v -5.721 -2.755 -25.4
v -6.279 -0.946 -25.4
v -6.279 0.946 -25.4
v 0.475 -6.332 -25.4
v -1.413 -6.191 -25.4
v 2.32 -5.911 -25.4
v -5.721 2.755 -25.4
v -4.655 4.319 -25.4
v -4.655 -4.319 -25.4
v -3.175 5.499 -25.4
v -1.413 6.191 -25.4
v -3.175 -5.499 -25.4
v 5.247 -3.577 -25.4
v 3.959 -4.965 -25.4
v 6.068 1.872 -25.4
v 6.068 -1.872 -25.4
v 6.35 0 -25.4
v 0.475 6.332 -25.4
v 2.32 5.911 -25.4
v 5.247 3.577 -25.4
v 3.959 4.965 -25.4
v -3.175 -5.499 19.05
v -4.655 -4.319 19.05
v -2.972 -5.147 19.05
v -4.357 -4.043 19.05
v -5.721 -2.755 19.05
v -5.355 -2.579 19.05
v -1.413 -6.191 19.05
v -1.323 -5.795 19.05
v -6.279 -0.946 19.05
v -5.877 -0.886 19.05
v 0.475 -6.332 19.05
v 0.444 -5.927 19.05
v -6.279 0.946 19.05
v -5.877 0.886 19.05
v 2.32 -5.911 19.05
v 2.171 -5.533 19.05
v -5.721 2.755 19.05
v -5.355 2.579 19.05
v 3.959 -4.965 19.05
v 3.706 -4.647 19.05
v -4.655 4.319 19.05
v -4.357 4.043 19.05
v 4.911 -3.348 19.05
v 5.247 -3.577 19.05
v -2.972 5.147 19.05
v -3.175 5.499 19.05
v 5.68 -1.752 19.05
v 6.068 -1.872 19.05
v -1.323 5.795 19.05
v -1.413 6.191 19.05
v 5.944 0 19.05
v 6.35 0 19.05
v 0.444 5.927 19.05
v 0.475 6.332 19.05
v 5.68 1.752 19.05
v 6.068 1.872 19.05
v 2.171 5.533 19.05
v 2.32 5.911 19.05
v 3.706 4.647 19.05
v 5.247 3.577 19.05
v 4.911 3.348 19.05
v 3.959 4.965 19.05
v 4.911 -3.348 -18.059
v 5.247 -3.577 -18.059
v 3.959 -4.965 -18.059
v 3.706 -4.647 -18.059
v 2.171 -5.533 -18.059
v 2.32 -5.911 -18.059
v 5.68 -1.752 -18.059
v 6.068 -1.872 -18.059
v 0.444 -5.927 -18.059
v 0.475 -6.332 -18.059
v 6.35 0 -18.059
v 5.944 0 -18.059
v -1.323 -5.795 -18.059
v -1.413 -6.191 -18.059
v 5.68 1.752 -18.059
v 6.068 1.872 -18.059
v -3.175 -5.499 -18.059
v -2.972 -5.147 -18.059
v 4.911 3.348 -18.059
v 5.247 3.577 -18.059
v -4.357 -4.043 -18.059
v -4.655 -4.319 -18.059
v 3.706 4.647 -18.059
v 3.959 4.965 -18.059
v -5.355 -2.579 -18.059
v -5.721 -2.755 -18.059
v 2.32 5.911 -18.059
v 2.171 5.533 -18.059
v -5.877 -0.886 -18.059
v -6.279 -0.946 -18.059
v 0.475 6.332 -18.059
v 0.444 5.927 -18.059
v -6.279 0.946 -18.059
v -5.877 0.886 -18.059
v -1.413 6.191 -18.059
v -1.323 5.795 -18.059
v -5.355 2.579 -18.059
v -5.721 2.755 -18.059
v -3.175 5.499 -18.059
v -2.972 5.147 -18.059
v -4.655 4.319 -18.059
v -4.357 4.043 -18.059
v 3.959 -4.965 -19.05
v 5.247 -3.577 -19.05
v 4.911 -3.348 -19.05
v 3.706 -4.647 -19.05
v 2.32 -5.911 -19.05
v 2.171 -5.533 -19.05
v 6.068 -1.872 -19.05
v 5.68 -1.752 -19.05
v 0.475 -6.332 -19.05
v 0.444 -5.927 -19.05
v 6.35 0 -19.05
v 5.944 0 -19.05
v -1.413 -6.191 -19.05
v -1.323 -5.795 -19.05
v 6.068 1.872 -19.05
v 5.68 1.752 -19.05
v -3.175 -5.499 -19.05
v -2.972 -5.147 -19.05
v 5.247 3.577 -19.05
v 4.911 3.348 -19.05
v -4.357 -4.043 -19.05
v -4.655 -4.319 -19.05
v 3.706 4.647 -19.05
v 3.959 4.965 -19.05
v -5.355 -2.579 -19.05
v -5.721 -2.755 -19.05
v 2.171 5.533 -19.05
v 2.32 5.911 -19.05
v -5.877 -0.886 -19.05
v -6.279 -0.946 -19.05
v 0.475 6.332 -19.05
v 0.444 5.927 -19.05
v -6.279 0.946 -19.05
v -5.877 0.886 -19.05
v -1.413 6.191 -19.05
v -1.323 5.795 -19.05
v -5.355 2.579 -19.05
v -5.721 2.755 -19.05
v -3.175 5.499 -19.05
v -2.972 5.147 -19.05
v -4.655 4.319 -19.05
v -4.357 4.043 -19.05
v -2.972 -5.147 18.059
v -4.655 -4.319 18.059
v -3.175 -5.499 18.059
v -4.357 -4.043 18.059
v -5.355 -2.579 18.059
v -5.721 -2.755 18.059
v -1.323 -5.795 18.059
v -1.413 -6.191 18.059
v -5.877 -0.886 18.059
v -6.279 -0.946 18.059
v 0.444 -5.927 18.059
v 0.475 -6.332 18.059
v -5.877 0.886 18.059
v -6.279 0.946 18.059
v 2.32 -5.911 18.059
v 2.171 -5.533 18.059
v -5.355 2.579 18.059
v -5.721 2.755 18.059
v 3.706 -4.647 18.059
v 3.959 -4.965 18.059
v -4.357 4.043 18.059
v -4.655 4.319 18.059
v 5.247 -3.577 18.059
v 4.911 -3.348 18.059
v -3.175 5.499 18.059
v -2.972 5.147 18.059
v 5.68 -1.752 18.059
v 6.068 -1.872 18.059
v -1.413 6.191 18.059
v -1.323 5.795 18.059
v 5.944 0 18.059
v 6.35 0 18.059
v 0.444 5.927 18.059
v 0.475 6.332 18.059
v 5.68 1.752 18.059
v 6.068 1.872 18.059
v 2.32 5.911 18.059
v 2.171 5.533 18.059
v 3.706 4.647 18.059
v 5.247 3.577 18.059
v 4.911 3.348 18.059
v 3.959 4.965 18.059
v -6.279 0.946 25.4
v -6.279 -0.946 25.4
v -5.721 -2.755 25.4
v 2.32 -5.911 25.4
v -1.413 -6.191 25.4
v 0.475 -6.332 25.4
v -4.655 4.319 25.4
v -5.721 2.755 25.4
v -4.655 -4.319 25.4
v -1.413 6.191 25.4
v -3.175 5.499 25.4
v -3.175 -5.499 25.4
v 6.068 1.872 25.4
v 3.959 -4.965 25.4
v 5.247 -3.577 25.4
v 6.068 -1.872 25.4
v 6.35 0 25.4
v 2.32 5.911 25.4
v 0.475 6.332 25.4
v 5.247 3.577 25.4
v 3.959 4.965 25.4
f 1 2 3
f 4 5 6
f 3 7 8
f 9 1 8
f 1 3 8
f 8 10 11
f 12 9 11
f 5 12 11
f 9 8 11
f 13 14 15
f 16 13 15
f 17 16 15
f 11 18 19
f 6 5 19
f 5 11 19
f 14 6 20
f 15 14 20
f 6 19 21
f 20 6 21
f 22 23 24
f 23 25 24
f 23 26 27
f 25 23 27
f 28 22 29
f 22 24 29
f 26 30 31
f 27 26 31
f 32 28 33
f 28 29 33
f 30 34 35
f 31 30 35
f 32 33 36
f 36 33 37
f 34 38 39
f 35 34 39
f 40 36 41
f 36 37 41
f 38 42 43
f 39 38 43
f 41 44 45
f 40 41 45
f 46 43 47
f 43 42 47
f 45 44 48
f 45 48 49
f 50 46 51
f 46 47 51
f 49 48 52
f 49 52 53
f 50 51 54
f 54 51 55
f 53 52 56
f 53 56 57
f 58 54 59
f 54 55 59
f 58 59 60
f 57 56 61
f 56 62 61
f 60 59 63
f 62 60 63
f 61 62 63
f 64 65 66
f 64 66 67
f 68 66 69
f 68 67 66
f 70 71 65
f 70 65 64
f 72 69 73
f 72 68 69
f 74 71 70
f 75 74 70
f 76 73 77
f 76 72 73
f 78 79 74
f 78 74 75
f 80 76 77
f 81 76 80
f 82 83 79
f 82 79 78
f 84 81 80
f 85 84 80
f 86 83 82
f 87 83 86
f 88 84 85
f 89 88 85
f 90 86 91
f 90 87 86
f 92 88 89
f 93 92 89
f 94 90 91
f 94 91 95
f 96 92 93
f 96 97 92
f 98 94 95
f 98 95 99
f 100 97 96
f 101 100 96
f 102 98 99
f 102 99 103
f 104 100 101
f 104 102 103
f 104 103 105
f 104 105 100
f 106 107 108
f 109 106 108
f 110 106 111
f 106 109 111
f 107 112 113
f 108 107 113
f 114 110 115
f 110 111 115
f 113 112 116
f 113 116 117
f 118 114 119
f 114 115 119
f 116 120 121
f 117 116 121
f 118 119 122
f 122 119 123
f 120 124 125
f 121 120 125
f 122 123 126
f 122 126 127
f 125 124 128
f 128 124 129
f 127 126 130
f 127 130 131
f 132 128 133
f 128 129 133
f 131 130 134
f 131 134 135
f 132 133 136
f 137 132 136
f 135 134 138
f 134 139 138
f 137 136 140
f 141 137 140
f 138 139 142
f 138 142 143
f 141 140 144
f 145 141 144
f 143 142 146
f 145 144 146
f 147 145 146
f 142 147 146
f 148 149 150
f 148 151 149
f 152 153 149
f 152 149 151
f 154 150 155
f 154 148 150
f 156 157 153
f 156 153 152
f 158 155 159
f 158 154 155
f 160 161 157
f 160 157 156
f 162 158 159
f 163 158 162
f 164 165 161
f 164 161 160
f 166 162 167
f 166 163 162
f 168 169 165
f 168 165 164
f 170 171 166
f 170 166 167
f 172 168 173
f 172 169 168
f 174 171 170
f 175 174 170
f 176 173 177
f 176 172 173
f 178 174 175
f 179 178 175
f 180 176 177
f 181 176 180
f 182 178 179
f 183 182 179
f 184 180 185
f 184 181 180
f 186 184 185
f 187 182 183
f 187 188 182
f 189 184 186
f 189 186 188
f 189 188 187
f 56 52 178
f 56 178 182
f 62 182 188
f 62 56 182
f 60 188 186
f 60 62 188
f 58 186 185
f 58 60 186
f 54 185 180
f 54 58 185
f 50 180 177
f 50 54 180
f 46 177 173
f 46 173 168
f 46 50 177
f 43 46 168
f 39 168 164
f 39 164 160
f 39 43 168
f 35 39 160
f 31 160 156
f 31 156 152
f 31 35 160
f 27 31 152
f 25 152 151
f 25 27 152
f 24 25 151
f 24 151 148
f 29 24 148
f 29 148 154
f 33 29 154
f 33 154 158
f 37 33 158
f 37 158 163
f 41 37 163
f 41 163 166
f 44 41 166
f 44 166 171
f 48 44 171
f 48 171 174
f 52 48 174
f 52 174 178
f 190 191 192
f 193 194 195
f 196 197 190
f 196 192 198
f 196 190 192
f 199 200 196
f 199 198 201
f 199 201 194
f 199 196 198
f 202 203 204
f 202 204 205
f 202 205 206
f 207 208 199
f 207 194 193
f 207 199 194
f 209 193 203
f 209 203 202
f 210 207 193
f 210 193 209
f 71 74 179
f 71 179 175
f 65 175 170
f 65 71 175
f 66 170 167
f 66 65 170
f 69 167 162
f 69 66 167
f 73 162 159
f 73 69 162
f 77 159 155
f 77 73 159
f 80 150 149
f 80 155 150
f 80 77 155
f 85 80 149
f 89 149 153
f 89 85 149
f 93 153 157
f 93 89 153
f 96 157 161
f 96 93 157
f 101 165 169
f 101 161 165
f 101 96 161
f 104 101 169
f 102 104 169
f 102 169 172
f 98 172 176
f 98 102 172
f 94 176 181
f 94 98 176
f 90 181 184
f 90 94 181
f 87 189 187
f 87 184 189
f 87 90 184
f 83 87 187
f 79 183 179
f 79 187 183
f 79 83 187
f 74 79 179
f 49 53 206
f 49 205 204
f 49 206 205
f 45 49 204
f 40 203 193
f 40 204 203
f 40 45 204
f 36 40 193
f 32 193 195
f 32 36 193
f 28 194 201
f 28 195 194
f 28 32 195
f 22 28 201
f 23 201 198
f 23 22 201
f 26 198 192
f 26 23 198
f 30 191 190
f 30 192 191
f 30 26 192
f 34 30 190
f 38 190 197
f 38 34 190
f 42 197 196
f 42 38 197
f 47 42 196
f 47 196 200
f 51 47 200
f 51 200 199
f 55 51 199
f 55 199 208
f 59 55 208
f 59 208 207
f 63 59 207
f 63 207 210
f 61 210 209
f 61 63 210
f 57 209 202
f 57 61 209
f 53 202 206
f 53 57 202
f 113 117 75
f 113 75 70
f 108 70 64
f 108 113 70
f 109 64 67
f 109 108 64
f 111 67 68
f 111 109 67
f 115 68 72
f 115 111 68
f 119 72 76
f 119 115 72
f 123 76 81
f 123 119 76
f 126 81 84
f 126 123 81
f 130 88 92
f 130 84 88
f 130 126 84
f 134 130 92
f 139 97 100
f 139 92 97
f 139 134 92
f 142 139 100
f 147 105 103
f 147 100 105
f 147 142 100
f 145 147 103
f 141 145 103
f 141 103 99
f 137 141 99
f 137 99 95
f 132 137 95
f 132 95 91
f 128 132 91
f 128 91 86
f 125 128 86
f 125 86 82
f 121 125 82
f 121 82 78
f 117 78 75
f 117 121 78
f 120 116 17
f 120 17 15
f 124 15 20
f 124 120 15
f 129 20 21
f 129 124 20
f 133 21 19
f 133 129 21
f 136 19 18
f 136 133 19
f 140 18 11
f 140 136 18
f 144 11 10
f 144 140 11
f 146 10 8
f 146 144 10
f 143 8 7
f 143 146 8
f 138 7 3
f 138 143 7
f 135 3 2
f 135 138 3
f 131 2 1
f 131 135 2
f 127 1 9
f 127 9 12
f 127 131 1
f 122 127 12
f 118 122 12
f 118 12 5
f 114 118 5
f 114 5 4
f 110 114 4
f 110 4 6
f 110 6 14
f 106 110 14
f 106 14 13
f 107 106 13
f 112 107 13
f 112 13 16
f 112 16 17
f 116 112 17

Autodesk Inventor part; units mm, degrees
ref_plane "YZ Plane" through (0, 0, 0) normal (1, 0, 0) x (0, 1, 0)
ref_plane "XZ Plane" through (0, 0, 0) normal (0, 1, 0) x (-1, 0, 0)
sketch "Sketch1" plane through (0, 0, 0) normal (0, 0, 1) x (1, 0, 0)
  circle A0 centre (0, 0) radius 6.35
  dimension "d0" = 12.7
extrude "Extrusion1" add sketch "Sketch1" along normal mid plane 50.8
ref_plane "Work Plane1" through (0, 0, 19.05) normal (0, 0, 1) x (1, 0, 0)
sketch "Sketch2" plane through (0, 0, 19.05) normal (0, 0, 1) x (1, 0, 0)
  circle A0 centre (0, 0) radius 6.35 projected
  circle A1 centre (0, 0) radius 6.35
  circle A2 centre (0, 0) radius 5.9436
  dimension "d4" = 12.7
  dimension "d5" = 11.8872
extrude "Extrusion2" cut sketch "Sketch2" against normal blind 0.9906
mirror "Mirror1" about plane through (0, 0, 0) normal (0, 0, 1) of "Extrusion2"
ref_plane "Work Plane2" through (0, 0, -19.05) normal (0, 0, 1) x (1, 0, 0)
properties part number "Linear Actuator Top Pin .5in. Dia." material "Aluminum 6061"
